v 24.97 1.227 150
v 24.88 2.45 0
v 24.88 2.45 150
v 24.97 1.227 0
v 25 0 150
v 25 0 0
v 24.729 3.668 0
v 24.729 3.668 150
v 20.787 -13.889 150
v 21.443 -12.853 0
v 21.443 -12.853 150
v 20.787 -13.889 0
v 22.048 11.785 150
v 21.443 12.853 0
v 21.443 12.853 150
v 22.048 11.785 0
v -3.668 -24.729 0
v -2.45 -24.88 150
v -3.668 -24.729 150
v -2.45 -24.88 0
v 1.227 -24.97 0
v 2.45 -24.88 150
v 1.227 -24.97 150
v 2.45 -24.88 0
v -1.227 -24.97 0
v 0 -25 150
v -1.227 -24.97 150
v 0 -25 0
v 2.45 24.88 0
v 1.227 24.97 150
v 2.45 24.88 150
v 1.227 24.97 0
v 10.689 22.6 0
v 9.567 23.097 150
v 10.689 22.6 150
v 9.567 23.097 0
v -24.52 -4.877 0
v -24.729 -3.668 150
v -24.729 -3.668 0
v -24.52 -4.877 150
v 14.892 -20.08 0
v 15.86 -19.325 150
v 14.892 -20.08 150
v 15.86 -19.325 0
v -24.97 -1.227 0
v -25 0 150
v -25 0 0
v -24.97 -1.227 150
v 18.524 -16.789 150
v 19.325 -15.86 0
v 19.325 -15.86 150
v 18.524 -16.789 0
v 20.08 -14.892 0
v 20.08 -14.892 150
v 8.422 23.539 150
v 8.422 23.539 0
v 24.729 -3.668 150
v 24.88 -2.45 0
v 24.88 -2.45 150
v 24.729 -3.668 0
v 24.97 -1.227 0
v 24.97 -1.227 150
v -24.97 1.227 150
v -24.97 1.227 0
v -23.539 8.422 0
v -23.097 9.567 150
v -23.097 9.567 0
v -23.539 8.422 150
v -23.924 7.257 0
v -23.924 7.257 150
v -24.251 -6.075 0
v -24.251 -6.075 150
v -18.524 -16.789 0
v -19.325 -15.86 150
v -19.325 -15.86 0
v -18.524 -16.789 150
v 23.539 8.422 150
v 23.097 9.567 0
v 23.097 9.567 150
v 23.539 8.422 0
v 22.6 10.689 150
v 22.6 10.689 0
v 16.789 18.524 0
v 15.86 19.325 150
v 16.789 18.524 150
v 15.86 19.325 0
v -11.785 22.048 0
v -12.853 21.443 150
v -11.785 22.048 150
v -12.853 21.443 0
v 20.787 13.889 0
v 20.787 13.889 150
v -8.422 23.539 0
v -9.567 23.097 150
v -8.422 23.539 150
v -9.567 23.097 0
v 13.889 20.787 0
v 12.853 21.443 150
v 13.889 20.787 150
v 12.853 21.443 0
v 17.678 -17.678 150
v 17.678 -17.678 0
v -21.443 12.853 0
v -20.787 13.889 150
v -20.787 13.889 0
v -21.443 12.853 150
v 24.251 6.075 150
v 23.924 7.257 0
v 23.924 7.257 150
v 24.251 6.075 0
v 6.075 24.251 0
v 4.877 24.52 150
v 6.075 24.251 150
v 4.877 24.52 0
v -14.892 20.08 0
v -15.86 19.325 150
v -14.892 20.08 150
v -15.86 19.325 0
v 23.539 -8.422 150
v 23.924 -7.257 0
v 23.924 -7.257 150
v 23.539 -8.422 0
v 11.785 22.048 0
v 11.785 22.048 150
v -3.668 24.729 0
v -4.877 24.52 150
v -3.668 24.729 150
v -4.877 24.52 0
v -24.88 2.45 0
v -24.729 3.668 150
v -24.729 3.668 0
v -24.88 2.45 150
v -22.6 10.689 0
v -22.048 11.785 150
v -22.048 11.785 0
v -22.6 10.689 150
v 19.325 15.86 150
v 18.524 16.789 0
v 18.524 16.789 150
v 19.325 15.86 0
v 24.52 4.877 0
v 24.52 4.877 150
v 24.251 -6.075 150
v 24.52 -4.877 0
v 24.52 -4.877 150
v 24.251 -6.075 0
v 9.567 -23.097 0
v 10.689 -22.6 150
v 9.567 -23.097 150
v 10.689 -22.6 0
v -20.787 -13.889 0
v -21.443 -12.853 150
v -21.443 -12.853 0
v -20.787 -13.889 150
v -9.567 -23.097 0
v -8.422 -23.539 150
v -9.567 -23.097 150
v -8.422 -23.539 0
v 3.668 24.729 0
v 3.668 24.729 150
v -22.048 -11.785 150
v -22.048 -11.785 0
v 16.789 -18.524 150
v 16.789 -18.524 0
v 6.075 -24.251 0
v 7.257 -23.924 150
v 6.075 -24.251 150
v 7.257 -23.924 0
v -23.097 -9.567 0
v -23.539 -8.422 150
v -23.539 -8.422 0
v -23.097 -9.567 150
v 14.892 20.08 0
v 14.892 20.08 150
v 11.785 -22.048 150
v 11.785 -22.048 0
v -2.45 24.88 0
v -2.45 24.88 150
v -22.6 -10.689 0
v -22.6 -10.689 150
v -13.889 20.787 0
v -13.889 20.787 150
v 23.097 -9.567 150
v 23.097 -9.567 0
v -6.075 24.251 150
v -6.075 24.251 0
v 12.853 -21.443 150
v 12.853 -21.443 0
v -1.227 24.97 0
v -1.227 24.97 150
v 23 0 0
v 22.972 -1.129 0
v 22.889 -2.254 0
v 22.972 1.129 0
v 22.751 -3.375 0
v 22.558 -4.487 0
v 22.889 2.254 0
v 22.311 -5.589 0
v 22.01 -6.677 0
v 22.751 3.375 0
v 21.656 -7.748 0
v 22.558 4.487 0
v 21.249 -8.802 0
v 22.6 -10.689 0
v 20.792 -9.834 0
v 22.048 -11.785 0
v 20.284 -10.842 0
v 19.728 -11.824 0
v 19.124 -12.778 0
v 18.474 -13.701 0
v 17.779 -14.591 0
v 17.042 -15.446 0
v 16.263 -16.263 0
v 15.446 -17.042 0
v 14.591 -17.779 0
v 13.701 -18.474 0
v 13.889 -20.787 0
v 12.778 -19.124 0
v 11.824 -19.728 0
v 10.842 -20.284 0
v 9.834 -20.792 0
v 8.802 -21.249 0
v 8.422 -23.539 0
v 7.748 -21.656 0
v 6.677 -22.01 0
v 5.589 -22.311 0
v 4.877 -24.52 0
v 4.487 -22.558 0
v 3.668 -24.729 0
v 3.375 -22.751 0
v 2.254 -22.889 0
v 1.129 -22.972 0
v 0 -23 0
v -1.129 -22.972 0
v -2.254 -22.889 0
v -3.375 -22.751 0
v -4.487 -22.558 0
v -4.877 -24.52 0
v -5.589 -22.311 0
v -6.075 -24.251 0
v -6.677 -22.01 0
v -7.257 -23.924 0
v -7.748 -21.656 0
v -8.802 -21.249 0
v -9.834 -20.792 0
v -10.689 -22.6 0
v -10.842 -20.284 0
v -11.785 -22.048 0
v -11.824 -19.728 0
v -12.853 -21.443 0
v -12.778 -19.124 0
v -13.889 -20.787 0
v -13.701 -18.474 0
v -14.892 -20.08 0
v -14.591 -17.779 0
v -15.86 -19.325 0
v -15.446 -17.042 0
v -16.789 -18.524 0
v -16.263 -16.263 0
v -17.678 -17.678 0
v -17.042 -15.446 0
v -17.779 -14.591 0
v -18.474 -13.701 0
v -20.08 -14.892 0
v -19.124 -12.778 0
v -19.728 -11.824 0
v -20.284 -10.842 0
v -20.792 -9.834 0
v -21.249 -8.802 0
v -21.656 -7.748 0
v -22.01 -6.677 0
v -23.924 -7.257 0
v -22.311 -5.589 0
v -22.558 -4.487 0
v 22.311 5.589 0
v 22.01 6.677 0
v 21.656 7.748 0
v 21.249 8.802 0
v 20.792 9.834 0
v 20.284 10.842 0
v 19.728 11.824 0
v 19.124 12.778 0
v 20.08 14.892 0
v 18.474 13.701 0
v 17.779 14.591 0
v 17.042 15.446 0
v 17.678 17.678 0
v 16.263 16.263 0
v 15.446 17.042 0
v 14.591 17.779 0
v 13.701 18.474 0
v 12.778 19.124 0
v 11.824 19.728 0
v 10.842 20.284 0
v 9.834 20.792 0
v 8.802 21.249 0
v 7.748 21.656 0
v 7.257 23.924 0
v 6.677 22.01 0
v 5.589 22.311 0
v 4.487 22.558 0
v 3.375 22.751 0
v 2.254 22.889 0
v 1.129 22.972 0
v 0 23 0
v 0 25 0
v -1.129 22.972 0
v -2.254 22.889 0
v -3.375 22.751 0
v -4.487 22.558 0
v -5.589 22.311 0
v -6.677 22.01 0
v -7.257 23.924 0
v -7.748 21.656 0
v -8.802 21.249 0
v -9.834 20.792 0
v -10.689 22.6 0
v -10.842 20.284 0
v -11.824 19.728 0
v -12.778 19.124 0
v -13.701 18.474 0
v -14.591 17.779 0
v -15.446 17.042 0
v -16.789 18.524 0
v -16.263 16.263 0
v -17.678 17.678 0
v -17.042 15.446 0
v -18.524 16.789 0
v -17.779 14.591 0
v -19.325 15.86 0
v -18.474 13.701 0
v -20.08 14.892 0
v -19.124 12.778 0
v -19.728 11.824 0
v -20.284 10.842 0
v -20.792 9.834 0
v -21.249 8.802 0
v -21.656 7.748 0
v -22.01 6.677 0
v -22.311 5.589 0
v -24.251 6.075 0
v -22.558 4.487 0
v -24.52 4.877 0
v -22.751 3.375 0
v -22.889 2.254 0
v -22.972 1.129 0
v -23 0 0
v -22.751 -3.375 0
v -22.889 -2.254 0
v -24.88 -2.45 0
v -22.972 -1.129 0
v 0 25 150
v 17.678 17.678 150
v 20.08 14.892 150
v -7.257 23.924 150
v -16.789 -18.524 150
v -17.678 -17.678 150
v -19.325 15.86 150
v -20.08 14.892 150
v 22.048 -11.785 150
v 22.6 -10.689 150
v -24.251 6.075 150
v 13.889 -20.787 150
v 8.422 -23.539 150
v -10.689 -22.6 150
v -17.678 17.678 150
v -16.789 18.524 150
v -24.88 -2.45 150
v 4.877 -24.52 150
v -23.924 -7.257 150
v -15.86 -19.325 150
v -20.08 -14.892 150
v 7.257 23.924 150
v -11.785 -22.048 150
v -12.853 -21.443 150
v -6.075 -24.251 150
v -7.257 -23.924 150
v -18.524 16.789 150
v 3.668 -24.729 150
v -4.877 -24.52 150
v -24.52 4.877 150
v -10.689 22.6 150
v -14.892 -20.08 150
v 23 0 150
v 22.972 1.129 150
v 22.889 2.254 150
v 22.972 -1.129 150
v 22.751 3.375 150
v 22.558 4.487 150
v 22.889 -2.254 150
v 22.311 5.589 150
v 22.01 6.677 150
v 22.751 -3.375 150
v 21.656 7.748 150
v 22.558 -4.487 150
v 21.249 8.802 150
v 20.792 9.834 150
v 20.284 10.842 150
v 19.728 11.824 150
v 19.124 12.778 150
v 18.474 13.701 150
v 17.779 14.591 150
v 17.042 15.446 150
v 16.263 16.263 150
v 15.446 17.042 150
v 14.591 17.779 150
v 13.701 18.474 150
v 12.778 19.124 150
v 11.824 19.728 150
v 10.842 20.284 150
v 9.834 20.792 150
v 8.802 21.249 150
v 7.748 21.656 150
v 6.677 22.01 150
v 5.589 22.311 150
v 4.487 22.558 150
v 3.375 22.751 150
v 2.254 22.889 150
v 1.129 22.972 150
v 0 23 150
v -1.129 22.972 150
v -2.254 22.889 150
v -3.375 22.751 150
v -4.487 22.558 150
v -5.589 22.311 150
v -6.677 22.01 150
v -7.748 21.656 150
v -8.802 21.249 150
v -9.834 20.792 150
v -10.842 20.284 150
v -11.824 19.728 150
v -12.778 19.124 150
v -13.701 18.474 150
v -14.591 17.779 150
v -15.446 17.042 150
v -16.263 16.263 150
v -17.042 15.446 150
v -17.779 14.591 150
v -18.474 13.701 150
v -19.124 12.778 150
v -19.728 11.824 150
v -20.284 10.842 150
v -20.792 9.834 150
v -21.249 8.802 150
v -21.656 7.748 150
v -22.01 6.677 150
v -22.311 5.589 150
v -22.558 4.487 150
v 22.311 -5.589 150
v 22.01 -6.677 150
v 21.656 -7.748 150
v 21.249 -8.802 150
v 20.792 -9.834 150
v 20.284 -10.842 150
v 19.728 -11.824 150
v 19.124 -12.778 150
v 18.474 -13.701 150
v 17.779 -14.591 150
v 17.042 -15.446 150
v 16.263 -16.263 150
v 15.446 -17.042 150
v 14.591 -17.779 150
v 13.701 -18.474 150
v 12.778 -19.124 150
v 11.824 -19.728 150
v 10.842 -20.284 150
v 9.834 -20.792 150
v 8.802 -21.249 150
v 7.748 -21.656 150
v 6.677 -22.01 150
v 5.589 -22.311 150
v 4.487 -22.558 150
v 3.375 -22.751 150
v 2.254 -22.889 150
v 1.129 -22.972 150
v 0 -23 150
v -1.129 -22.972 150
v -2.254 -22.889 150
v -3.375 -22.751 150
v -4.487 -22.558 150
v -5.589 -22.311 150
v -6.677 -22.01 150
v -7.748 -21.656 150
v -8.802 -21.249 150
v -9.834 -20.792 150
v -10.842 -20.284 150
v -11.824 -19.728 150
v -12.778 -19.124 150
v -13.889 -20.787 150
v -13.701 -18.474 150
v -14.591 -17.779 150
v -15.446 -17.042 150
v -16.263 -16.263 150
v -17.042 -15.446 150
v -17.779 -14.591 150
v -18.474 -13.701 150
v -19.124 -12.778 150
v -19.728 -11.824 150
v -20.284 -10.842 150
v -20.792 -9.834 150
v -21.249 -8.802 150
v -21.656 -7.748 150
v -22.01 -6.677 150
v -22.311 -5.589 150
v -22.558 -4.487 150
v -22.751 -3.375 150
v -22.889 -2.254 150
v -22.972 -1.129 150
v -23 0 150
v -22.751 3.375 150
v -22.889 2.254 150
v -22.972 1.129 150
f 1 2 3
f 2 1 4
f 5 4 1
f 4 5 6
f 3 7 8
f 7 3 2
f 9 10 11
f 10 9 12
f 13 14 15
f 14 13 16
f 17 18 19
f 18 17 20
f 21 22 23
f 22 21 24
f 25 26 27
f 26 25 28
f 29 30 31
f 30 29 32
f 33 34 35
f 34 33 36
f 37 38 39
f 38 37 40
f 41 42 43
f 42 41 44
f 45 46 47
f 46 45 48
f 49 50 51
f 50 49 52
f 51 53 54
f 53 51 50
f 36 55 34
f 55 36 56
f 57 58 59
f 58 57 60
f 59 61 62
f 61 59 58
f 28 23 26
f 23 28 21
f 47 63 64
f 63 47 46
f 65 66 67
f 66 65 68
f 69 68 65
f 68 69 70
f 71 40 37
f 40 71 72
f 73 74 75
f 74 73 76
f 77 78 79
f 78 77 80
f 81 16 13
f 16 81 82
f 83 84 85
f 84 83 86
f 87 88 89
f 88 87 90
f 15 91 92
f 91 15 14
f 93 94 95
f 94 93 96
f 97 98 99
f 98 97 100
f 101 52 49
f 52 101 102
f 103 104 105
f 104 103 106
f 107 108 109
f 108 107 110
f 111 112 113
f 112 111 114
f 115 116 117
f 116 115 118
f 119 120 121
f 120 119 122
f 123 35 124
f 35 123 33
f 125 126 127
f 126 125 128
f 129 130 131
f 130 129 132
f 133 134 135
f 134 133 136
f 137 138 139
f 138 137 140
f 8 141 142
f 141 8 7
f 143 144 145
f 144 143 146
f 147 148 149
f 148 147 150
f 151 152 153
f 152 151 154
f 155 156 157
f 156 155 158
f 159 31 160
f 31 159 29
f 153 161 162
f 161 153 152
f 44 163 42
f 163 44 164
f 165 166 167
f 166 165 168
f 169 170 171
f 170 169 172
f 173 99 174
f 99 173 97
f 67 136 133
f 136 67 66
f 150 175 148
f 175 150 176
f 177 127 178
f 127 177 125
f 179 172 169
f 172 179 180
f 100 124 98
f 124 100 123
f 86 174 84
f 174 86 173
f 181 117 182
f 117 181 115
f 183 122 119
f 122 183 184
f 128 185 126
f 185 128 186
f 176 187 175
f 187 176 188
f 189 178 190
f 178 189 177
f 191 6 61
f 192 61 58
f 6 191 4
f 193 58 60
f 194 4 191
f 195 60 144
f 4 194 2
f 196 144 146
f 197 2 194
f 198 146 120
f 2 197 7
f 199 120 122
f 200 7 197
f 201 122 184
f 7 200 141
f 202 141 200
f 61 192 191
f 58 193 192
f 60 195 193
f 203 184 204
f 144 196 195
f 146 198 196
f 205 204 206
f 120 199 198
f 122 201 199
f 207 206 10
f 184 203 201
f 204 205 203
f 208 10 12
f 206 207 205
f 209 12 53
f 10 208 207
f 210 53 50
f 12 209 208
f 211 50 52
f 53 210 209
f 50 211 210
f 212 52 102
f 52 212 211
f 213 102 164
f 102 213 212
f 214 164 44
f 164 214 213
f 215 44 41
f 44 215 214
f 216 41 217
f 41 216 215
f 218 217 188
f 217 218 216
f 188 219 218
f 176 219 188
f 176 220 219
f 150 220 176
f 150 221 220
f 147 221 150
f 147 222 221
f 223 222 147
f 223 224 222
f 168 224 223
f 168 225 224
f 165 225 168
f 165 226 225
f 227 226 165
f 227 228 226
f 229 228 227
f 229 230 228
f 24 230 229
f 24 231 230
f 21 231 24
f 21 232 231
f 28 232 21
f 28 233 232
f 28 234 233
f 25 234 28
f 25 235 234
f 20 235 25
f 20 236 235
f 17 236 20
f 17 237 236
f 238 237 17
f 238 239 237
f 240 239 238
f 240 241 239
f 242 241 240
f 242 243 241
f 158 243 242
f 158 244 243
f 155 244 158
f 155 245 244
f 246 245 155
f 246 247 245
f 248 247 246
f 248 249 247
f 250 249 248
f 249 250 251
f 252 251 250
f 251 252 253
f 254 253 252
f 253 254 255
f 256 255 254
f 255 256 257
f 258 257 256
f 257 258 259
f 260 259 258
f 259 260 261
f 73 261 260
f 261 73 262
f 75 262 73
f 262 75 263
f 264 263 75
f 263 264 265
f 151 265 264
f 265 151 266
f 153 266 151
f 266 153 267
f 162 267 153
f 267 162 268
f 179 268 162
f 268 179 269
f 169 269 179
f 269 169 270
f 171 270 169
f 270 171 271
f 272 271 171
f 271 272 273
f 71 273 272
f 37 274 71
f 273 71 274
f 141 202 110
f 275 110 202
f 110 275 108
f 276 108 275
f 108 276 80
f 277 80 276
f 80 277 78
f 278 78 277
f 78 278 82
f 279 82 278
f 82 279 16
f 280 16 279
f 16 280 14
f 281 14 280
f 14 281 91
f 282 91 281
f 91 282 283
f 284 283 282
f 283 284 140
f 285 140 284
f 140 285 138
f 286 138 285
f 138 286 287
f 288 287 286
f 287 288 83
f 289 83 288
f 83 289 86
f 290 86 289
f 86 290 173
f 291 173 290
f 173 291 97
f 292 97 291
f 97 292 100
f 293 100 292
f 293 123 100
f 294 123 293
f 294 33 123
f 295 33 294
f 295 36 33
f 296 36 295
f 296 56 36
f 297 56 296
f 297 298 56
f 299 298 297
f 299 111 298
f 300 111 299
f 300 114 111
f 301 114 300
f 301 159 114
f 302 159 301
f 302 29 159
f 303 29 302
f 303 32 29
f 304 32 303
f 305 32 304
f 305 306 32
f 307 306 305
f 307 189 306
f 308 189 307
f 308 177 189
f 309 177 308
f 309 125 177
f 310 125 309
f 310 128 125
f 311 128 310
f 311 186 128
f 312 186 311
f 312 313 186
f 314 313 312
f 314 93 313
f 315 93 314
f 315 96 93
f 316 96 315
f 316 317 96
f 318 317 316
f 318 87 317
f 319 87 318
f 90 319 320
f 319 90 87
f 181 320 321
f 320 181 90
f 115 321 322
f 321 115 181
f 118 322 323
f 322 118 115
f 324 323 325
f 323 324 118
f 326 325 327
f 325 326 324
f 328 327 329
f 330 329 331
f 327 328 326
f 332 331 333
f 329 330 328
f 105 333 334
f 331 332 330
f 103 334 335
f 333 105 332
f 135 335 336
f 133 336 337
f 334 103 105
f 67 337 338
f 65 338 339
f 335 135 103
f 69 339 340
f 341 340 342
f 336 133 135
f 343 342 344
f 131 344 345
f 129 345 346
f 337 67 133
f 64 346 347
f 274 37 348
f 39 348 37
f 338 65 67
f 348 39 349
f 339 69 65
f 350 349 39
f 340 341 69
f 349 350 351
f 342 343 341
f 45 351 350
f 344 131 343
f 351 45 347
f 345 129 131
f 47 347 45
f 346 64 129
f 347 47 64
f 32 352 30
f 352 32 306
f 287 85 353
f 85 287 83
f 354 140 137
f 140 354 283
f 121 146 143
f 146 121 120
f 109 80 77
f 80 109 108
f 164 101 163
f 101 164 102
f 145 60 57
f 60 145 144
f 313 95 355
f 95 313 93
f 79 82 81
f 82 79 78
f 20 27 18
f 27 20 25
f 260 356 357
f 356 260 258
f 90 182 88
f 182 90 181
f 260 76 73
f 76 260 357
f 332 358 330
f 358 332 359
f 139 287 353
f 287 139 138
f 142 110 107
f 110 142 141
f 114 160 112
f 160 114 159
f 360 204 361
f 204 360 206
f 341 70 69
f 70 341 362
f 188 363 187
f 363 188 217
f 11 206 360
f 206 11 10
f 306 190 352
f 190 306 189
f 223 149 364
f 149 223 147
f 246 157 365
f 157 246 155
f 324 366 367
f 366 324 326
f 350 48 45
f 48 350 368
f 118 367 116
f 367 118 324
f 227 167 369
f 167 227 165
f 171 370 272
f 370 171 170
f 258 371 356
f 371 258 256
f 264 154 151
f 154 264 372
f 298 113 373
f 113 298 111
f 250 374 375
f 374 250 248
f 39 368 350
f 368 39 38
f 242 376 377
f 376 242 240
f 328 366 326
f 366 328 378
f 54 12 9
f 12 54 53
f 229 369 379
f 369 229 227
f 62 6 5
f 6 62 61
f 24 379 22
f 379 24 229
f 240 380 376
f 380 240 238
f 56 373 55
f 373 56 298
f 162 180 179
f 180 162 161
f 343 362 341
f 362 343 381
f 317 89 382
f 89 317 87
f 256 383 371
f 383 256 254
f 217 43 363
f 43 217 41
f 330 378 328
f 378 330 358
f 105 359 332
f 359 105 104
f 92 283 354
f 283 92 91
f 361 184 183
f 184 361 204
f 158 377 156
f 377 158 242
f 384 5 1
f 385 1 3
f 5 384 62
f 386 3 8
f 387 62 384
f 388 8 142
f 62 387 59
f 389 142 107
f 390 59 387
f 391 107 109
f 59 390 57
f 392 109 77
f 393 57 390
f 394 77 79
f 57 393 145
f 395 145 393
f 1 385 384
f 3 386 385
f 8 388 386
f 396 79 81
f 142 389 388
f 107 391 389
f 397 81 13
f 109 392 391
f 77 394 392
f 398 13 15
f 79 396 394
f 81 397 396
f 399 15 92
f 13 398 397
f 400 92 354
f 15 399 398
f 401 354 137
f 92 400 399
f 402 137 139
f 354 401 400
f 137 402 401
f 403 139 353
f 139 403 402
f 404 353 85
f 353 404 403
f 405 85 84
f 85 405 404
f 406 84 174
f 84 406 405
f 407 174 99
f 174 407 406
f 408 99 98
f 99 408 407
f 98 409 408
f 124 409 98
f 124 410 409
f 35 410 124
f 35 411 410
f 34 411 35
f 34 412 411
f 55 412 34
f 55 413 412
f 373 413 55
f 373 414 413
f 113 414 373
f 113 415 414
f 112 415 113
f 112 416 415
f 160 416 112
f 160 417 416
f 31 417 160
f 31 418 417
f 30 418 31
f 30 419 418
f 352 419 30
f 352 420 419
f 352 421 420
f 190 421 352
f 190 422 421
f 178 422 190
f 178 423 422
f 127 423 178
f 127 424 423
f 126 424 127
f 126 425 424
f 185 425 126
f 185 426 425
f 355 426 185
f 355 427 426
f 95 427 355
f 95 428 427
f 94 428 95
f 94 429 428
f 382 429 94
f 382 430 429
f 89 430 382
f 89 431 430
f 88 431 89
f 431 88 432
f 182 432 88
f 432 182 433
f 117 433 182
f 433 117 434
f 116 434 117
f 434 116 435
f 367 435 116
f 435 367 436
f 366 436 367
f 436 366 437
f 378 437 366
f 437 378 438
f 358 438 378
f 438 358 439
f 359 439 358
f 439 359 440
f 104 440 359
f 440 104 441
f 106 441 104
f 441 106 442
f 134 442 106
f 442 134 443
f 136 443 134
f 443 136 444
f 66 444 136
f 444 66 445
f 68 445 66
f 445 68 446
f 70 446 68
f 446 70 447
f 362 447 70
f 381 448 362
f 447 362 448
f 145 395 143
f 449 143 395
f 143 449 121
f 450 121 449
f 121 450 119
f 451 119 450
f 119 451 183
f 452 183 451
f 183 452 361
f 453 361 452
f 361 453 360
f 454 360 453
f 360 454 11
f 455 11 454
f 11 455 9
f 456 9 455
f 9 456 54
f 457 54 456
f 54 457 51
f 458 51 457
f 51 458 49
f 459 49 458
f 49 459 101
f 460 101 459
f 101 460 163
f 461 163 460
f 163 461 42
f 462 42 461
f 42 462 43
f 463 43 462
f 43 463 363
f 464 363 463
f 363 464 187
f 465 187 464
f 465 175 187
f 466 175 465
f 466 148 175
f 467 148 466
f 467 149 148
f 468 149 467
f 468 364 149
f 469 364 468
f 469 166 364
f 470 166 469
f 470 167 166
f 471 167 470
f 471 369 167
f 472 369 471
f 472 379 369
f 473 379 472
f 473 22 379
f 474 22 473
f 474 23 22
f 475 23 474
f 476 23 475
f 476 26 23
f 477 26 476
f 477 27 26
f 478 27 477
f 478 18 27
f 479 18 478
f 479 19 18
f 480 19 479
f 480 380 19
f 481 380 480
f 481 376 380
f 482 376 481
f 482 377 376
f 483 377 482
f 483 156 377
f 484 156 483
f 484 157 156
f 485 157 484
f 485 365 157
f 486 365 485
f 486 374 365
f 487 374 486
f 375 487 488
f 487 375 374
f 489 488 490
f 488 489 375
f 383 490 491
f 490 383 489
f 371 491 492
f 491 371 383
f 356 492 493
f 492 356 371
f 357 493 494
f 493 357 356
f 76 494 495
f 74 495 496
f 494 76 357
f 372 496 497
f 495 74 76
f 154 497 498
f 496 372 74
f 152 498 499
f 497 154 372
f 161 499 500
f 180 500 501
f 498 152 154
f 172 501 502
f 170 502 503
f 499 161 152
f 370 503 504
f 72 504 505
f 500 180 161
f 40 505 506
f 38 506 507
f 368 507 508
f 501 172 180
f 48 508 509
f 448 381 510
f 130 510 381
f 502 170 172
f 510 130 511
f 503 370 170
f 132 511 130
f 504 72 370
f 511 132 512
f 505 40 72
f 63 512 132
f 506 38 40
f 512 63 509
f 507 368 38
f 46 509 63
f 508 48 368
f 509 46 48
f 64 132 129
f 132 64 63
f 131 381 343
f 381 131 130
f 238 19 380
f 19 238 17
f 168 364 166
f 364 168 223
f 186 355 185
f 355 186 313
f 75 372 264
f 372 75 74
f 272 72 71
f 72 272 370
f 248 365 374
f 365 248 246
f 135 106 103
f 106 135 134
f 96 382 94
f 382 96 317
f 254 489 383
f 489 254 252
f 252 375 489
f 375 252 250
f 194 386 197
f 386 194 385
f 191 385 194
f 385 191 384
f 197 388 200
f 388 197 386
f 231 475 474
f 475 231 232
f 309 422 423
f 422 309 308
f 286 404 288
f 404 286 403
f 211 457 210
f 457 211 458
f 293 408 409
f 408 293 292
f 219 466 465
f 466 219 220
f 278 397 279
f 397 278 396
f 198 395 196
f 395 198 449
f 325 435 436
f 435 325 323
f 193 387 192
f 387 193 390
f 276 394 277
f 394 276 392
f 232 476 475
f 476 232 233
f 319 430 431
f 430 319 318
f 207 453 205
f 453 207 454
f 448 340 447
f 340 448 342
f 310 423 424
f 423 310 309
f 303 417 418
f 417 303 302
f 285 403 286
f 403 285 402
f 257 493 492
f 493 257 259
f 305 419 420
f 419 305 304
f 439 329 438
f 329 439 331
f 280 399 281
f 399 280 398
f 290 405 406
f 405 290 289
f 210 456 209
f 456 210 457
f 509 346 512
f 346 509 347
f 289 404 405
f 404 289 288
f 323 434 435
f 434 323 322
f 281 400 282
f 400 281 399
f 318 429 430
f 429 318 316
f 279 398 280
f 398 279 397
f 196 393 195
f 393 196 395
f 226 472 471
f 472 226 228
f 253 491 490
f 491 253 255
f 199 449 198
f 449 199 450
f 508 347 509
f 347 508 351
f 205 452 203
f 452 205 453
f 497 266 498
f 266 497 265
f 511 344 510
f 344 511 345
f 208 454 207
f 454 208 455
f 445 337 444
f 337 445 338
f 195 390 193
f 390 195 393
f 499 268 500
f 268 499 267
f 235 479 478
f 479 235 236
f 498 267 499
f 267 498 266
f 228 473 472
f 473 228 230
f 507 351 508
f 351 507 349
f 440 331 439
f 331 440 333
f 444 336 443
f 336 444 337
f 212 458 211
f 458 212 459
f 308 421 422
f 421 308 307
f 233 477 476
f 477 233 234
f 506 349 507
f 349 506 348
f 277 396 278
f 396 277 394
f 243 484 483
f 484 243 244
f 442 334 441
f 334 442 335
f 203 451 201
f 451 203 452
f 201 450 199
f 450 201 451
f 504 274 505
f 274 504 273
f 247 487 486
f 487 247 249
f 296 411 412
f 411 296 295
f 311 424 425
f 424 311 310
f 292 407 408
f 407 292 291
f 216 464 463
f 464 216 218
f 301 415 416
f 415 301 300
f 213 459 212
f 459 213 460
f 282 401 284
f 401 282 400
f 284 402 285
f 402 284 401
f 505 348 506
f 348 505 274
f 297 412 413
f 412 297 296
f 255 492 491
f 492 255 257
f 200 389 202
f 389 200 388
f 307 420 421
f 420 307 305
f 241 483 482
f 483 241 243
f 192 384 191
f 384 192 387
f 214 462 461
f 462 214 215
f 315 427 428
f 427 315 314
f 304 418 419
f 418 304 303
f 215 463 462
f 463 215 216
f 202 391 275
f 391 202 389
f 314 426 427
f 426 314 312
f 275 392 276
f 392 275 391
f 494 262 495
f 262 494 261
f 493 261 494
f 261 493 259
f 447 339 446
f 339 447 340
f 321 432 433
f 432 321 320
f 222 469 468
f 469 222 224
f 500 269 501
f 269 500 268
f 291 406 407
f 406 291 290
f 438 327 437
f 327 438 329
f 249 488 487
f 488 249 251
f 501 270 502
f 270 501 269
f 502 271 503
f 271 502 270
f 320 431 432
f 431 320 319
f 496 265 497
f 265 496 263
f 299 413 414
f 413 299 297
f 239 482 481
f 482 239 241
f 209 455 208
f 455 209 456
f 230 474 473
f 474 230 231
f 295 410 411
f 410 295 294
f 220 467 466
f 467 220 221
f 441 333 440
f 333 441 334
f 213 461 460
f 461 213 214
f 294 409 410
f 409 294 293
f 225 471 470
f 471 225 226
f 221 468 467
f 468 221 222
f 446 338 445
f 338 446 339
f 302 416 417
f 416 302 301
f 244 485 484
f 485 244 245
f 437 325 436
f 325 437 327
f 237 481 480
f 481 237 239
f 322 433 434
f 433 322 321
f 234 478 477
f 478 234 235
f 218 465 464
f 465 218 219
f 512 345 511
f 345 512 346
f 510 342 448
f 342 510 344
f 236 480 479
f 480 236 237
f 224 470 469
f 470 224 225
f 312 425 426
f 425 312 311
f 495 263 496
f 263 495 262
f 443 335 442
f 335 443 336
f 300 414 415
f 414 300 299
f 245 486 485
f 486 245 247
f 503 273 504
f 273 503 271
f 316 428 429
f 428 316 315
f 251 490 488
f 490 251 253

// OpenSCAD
$fn = 128;

// HT 50 pipe, length 150 mm
pipe_outer_diameter = 50; // mm
pipe_wall_thickness = 2;  // mm
pipe_length = 150;        // mm

// Robust boolean overlap
eps = 0.2;

module ht_pipe(od, wall, len) {
    id = od - 2*wall;
    assert(id > 0, "Wall thickness too large for given outer diameter.");

    difference() {
        // Outer solid (not centered to avoid view/camera issues)
        cylinder(h = len, d = od, center = false);

        // Inner void: start slightly below and extend slightly above to guarantee through-cut
        translate([0, 0, -eps])
            cylinder(h = len + 2*eps, d = id, center = false);
    }
}

ht_pipe(pipe_outer_diameter, pipe_wall_thickness, pipe_length);
